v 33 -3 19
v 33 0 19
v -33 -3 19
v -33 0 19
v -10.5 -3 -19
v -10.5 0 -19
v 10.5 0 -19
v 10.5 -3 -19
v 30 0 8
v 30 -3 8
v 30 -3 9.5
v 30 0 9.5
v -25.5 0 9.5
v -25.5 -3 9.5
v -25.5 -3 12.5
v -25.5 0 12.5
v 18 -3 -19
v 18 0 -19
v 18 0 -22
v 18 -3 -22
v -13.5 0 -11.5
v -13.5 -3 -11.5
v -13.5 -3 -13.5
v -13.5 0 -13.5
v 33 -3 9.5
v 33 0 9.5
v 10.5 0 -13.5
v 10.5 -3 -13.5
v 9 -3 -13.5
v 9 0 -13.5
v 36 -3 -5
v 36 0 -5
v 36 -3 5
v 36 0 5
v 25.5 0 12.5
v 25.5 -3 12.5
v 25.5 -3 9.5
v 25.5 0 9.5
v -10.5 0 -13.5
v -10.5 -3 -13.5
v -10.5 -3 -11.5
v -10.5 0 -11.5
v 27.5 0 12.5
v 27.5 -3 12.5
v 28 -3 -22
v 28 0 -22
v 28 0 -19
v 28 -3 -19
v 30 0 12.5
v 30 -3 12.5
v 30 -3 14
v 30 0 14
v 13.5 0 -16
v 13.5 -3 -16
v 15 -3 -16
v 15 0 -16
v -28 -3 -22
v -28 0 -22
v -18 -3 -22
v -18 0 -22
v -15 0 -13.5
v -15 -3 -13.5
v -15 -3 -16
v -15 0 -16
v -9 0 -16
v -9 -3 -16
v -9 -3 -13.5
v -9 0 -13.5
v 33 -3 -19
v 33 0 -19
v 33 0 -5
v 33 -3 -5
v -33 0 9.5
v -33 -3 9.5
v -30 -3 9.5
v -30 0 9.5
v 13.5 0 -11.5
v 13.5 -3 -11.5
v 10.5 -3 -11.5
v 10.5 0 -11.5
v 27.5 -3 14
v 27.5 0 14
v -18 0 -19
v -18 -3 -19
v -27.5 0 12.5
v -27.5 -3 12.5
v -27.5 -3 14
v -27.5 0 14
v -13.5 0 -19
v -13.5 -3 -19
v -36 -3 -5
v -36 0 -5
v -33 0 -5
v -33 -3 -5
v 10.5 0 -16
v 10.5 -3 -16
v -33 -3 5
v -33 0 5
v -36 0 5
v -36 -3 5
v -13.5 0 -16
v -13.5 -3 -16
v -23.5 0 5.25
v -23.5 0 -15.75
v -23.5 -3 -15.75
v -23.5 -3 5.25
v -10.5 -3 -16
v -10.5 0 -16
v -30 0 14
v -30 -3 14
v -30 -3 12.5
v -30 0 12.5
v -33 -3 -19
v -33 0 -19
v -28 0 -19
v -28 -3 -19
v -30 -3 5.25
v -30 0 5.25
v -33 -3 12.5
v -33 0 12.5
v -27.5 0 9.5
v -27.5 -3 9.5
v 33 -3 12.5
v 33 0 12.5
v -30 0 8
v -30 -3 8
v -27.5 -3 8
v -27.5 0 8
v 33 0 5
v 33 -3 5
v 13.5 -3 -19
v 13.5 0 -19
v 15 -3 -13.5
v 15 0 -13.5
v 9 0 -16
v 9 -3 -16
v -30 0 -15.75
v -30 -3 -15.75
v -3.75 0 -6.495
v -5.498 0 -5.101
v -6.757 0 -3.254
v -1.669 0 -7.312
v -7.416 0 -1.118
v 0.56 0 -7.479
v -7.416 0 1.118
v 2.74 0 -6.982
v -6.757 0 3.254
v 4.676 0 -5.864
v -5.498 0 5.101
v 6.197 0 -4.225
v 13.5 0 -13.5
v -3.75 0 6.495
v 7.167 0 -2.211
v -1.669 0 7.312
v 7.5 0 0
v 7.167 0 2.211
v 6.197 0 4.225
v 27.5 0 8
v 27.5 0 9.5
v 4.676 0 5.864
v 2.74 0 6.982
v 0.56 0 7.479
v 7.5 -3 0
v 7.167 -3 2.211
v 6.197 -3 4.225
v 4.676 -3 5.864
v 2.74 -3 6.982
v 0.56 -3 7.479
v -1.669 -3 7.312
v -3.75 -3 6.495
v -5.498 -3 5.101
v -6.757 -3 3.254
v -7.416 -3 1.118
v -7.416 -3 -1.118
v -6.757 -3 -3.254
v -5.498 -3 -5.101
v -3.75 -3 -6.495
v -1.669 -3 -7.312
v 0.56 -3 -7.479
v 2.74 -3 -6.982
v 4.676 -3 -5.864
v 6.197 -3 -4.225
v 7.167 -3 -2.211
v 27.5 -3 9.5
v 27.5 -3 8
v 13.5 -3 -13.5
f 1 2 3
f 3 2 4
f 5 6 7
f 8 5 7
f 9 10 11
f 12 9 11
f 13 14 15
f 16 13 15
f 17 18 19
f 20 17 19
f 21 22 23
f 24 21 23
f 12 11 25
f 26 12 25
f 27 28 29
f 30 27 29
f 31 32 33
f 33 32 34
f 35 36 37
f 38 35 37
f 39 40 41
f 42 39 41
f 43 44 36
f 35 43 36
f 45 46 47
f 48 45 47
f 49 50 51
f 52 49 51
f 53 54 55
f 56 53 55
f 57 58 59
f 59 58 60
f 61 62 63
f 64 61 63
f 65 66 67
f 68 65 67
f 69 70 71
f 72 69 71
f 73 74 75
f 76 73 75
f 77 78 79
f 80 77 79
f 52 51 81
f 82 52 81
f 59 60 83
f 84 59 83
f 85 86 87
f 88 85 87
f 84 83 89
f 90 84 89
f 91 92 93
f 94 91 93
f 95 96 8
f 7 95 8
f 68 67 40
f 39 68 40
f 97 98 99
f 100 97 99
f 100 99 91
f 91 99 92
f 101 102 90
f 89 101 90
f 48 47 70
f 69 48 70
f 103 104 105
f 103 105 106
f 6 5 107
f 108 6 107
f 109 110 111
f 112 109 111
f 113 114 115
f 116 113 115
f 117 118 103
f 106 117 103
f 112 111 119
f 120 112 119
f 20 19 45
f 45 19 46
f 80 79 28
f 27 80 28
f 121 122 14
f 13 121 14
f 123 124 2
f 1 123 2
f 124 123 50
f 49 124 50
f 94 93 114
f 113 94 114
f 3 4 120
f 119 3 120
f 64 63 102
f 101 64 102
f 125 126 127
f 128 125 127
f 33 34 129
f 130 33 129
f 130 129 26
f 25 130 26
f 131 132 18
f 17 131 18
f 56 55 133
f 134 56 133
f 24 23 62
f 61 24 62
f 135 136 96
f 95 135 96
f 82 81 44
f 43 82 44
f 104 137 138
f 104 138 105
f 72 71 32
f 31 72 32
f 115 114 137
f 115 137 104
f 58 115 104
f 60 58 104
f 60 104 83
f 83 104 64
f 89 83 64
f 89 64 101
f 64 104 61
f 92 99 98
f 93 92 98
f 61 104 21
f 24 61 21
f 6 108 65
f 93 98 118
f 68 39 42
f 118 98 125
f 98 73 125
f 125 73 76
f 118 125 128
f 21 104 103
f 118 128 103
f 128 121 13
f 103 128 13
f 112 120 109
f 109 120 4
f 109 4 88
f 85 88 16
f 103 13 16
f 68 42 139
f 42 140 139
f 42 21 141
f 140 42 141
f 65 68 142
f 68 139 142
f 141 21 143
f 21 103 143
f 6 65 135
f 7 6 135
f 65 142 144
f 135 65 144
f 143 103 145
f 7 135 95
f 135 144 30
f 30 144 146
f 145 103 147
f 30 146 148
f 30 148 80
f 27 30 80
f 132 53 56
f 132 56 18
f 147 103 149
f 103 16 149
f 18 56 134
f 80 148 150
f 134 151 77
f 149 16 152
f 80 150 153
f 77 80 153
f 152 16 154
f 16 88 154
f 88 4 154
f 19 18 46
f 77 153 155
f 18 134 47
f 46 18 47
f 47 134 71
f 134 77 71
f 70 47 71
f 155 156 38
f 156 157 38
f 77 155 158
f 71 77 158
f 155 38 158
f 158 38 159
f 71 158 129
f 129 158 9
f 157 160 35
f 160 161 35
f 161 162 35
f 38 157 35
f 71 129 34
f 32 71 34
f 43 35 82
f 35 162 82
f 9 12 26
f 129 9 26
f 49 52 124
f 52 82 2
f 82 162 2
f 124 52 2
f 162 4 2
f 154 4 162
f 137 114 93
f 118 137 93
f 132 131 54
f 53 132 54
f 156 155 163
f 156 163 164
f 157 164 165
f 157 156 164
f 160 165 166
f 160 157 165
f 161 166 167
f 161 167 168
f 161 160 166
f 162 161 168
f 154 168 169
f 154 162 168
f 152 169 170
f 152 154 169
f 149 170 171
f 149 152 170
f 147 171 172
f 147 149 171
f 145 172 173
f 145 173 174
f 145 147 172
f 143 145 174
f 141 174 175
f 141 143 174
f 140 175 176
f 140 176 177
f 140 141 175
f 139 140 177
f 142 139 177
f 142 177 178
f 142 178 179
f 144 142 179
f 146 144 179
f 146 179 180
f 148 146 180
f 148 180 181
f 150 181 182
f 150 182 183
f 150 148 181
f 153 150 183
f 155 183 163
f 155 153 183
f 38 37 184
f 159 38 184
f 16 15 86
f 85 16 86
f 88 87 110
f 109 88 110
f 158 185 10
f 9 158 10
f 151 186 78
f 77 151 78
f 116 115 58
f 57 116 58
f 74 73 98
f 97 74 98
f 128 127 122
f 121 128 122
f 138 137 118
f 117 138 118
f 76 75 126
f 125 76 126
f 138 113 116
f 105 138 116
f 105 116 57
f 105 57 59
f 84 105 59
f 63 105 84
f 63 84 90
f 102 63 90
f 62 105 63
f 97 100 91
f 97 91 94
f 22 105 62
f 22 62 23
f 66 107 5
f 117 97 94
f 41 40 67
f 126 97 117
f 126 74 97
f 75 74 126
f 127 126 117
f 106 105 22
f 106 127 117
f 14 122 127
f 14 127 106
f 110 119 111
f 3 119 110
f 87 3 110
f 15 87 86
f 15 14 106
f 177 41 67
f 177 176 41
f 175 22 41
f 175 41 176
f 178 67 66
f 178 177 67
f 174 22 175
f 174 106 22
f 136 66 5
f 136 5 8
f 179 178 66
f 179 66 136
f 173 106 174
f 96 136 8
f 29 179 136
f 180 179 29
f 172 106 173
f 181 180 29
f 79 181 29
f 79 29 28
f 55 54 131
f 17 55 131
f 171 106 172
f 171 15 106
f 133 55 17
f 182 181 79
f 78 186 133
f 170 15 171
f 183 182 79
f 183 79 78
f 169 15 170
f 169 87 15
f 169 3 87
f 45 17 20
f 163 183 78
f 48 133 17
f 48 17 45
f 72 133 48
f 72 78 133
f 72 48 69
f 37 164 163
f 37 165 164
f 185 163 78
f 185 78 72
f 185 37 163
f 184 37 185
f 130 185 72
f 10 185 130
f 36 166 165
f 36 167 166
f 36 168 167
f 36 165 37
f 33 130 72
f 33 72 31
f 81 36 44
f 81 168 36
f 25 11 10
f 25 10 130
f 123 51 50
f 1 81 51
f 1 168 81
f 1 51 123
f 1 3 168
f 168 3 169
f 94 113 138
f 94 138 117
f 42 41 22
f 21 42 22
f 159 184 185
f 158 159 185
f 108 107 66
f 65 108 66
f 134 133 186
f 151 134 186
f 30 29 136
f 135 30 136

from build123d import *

# Parameters (mm, degrees)
F1_W     = 6.5
F1_H     = 21
F1_R     = 7.5
F2_DEPTH = 3
F4_DEPTH = 3


# Not quite as in the source:
# - a feature names something its author has since deleted; it is built from what else it names


with BuildPart() as f2:
    # F1 (on Front) → F2 (new body)
    with BuildSketch(Plane.XZ):
        Polygon((33, 5), (33, 19), (-33, 19), (-33, 5), (-36, 5), (-36, -5), (-33, -5), (-33, -19), (-28, -19), (-28, -22), (-18, -22), (-18, -19), (0, -19), (18, -19), (18, -22), (28, -22), (28, -19), (33, -19), (33, -5), (36, -5), (36, 5), align=None)
        with Locations((-26.75, -5.25)):
            Rectangle(F1_W, F1_H, mode=Mode.SUBTRACT)
        Circle(F1_R, mode=Mode.SUBTRACT)
    extrude(amount=F2_DEPTH)

    # F3 (on face) → F4 (cut, through all)
    with BuildSketch(Plane.XZ.offset(3)):
        Polygon((10.5, -16), (10.5, -19), (13.5, -19), (13.5, -16), (15, -16), (15, -13.5), (13.5, -13.5), (13.5, -11.5), (10.5, -11.5), (10.5, -13.5), (9, -13.5), (9, -16), align=None)
        Polygon((-13.5, -19), (-10.5, -19), (-10.5, -16), (-9, -16), (-9, -13.5), (-10.5, -13.5), (-10.5, -11.5), (-13.5, -11.5), (-13.5, -13.5), (-15, -13.5), (-15, -16), (-13.5, -16), align=None)
        Polygon((30, 9.5), (33, 9.5), (33, 12.5), (30, 12.5), (30, 14), (27.5, 14), (27.5, 12.5), (25.5, 12.5), (25.5, 9.5), (27.5, 9.5), (27.5, 8), (30, 8), align=None)
        Polygon((-33, 12.5), (-33, 9.5), (-30, 9.5), (-30, 8), (-27.5, 8), (-27.5, 9.5), (-25.5, 9.5), (-25.5, 12.5), (-27.5, 12.5), (-27.5, 14), (-30, 14), (-30, 12.5), align=None)
    extrude(amount=-F4_DEPTH, mode=Mode.SUBTRACT)


solid = f2.part
